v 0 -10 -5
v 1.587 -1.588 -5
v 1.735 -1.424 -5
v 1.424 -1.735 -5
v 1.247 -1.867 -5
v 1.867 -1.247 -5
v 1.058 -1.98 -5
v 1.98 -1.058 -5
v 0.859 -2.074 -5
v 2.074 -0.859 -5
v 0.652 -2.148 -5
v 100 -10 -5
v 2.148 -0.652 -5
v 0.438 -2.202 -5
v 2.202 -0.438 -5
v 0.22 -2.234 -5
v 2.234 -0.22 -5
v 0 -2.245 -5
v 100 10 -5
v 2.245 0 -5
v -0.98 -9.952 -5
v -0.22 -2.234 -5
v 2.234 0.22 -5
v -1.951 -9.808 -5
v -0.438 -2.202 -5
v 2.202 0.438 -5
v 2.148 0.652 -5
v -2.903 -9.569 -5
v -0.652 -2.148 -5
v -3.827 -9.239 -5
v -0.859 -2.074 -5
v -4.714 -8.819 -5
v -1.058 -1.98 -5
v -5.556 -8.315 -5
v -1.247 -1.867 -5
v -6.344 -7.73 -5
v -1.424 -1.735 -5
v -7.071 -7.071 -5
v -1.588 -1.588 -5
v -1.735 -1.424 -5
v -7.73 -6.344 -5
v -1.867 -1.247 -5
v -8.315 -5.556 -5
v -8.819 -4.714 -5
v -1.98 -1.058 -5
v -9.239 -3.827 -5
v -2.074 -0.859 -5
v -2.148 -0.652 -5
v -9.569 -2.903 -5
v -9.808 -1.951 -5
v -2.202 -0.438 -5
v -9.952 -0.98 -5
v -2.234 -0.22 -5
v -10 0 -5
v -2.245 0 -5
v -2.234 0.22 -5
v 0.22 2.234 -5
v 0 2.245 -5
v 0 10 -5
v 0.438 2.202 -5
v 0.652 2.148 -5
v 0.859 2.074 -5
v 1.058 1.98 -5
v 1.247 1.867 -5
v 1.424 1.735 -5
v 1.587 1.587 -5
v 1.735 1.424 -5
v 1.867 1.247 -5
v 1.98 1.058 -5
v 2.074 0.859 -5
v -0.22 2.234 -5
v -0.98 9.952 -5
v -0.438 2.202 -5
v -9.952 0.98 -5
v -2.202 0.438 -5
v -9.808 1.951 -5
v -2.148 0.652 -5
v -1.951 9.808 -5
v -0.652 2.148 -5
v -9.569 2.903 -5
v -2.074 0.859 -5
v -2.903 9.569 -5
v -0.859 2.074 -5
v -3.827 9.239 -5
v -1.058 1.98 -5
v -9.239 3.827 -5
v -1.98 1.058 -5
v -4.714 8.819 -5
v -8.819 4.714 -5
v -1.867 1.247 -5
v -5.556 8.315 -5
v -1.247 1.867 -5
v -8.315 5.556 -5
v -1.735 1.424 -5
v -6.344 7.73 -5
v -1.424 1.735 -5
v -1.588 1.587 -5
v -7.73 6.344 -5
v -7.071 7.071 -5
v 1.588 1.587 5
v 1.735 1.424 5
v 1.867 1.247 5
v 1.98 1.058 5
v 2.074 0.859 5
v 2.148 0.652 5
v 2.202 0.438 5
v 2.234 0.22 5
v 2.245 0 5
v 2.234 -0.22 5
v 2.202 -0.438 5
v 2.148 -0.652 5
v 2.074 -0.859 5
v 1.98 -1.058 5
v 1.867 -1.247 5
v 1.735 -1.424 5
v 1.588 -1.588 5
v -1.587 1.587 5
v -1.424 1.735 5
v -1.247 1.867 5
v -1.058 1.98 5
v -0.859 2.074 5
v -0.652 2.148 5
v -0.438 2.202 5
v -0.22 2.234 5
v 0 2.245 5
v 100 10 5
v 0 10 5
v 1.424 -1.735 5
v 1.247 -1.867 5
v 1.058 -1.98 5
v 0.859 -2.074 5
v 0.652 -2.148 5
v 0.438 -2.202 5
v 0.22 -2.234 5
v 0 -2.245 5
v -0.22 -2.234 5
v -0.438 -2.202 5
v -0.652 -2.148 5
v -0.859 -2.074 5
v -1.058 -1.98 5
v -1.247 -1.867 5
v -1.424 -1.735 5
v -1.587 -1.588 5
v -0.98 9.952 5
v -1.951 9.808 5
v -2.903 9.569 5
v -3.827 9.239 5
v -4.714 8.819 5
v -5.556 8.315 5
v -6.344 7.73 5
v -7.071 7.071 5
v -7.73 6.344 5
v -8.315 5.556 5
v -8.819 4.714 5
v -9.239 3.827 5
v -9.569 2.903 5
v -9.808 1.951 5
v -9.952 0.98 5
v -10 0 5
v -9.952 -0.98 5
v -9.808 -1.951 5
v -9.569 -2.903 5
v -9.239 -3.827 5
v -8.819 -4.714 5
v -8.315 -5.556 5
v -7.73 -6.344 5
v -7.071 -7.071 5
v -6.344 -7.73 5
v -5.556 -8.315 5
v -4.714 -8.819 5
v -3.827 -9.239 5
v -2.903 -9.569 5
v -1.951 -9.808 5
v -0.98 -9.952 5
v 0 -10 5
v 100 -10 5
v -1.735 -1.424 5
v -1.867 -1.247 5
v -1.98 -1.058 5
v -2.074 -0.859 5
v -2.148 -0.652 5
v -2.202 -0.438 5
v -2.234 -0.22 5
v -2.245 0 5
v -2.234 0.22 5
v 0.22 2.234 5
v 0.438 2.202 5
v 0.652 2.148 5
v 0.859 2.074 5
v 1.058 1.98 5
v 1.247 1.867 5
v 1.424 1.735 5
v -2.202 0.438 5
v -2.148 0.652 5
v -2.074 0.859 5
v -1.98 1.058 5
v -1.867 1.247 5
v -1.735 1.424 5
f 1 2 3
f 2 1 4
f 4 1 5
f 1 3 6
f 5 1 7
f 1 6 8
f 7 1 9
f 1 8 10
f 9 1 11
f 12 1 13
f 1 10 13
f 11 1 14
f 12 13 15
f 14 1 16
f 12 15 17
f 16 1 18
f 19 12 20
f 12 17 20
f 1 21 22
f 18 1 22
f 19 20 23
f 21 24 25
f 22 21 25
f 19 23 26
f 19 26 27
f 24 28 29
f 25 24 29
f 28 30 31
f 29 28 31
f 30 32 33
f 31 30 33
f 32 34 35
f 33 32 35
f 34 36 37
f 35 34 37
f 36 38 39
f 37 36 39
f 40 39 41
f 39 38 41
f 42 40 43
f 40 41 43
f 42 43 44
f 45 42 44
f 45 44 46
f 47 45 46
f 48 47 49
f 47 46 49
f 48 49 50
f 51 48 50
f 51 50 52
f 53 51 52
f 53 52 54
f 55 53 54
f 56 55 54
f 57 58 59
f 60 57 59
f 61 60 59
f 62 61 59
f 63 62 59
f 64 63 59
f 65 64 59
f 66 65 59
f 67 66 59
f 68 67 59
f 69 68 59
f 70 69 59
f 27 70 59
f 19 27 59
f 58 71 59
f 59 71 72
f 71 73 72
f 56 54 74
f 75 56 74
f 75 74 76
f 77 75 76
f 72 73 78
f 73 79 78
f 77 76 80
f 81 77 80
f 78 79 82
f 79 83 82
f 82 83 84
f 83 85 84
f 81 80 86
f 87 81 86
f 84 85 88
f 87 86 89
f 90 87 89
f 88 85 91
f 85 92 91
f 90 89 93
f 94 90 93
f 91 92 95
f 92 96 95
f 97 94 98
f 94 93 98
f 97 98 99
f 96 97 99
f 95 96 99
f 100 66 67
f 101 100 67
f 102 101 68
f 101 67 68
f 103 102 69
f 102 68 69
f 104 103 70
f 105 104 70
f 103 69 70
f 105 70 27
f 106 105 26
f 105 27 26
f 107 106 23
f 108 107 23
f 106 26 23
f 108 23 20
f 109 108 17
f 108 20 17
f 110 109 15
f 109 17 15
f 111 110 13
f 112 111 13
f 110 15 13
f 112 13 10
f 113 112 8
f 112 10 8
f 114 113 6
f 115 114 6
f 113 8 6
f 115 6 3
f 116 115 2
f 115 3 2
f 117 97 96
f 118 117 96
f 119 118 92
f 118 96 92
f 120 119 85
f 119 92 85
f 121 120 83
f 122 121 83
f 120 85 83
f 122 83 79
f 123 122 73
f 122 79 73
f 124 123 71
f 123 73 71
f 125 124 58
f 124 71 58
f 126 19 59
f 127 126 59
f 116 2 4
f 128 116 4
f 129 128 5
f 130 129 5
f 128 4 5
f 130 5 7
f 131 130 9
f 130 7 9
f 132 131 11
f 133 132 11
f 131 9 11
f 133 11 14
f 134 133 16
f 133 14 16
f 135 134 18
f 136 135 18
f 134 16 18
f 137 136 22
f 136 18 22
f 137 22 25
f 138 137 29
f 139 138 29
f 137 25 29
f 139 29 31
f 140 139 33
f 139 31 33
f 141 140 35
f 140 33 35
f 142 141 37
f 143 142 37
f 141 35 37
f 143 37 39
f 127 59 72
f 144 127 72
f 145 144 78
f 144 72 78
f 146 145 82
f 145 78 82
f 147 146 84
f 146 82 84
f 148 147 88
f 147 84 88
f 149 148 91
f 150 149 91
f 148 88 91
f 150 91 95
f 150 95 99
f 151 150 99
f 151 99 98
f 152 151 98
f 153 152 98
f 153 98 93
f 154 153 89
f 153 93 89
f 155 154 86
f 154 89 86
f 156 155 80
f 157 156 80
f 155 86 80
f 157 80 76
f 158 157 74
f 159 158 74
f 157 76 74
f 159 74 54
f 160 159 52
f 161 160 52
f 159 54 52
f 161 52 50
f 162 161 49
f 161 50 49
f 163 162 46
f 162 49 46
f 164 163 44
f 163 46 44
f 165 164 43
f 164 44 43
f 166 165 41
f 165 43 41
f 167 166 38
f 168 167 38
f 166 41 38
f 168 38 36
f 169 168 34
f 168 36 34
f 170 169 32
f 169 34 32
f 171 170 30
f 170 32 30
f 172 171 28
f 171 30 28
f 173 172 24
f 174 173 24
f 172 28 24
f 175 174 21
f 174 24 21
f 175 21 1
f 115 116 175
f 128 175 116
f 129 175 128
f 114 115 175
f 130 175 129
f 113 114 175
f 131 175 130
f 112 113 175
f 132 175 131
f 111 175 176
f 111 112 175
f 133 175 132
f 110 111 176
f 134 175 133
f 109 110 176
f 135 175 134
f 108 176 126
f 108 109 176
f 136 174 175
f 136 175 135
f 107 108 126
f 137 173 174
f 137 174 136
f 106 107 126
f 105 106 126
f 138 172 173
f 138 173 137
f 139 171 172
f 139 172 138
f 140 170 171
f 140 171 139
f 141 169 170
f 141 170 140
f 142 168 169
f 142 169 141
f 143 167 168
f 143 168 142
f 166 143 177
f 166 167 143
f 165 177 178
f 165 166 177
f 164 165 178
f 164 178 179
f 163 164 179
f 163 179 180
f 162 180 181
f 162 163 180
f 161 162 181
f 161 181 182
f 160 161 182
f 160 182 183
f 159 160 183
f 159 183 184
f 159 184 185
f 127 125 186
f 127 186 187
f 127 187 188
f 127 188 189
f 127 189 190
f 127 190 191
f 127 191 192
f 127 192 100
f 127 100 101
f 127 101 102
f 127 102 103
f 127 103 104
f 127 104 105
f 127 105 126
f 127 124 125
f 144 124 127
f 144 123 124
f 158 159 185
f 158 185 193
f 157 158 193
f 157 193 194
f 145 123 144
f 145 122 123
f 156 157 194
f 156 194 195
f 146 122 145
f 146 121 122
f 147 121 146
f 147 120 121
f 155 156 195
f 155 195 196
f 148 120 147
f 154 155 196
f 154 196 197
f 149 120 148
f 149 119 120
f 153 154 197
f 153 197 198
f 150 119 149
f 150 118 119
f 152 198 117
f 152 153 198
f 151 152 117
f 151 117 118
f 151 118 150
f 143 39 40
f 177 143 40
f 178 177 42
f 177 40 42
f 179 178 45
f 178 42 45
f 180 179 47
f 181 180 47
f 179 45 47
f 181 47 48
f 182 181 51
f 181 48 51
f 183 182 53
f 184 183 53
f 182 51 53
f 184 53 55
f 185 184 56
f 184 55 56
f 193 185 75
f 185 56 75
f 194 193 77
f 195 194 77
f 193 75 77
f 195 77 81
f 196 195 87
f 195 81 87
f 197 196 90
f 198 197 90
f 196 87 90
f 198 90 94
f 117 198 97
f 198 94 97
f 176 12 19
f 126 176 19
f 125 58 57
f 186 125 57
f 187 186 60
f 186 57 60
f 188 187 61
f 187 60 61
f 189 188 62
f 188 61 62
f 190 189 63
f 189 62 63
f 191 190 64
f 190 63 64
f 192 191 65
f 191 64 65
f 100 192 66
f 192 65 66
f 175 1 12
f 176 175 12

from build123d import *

# Parameters (mm, degrees)
BOSS_EXTRUDE1_DEPTH   = 10
BODY_MOVE_COPY1_ANGLE = 120


with BuildPart() as part:
    # Sketch1 → Boss-Extrude1 (new body)
    with BuildSketch(Plane(origin=(0, 0, 0), x_dir=(1, 0, 0), z_dir=(0, 1, 0))):
        with BuildLine():
            Line((-10, 0), (10, 0))
            Line((10, 0), (10, 100))
            ThreePointArc((10, 100), (0, 110), (-10, 100))
            Line((-10, 100), (-10, 0))
        make_face()
        with BuildLine():
            ThreePointArc((1.5875, 98.4125), (0, 97.75493597), (-1.5875, 98.4125))
            ThreePointArc((-1.5875, 98.4125), (-2.24506403, 100), (-1.5875, 101.5875))
            ThreePointArc((-1.5875, 101.5875), (0, 102.24506403), (1.5875, 101.5875))
            ThreePointArc((1.5875, 101.5875), (2.074168707, 100.859148809), (2.24506403, 100))
            ThreePointArc((2.24506403, 100), (2.074168707, 99.140851191), (1.5875, 98.4125))
        make_face(mode=Mode.SUBTRACT)
    extrude(amount=BOSS_EXTRUDE1_DEPTH)


with BuildPart() as part_1:
    # Body-Move/Copy1: moved
    add(part.part.moved(Location((0, 0, 0))).rotate(Axis((-1.666666667, 3.333333333, -1.666666667), (0.5773502691894747, 0.5773502691901298, 0.5773502691892728)), BODY_MOVE_COPY1_ANGLE))


with BuildPart() as part_2:
    # Body-Move/Copy2: moved
    add(part_1.part.moved(Location((100, -5, 0))))


solid = part_2.part
